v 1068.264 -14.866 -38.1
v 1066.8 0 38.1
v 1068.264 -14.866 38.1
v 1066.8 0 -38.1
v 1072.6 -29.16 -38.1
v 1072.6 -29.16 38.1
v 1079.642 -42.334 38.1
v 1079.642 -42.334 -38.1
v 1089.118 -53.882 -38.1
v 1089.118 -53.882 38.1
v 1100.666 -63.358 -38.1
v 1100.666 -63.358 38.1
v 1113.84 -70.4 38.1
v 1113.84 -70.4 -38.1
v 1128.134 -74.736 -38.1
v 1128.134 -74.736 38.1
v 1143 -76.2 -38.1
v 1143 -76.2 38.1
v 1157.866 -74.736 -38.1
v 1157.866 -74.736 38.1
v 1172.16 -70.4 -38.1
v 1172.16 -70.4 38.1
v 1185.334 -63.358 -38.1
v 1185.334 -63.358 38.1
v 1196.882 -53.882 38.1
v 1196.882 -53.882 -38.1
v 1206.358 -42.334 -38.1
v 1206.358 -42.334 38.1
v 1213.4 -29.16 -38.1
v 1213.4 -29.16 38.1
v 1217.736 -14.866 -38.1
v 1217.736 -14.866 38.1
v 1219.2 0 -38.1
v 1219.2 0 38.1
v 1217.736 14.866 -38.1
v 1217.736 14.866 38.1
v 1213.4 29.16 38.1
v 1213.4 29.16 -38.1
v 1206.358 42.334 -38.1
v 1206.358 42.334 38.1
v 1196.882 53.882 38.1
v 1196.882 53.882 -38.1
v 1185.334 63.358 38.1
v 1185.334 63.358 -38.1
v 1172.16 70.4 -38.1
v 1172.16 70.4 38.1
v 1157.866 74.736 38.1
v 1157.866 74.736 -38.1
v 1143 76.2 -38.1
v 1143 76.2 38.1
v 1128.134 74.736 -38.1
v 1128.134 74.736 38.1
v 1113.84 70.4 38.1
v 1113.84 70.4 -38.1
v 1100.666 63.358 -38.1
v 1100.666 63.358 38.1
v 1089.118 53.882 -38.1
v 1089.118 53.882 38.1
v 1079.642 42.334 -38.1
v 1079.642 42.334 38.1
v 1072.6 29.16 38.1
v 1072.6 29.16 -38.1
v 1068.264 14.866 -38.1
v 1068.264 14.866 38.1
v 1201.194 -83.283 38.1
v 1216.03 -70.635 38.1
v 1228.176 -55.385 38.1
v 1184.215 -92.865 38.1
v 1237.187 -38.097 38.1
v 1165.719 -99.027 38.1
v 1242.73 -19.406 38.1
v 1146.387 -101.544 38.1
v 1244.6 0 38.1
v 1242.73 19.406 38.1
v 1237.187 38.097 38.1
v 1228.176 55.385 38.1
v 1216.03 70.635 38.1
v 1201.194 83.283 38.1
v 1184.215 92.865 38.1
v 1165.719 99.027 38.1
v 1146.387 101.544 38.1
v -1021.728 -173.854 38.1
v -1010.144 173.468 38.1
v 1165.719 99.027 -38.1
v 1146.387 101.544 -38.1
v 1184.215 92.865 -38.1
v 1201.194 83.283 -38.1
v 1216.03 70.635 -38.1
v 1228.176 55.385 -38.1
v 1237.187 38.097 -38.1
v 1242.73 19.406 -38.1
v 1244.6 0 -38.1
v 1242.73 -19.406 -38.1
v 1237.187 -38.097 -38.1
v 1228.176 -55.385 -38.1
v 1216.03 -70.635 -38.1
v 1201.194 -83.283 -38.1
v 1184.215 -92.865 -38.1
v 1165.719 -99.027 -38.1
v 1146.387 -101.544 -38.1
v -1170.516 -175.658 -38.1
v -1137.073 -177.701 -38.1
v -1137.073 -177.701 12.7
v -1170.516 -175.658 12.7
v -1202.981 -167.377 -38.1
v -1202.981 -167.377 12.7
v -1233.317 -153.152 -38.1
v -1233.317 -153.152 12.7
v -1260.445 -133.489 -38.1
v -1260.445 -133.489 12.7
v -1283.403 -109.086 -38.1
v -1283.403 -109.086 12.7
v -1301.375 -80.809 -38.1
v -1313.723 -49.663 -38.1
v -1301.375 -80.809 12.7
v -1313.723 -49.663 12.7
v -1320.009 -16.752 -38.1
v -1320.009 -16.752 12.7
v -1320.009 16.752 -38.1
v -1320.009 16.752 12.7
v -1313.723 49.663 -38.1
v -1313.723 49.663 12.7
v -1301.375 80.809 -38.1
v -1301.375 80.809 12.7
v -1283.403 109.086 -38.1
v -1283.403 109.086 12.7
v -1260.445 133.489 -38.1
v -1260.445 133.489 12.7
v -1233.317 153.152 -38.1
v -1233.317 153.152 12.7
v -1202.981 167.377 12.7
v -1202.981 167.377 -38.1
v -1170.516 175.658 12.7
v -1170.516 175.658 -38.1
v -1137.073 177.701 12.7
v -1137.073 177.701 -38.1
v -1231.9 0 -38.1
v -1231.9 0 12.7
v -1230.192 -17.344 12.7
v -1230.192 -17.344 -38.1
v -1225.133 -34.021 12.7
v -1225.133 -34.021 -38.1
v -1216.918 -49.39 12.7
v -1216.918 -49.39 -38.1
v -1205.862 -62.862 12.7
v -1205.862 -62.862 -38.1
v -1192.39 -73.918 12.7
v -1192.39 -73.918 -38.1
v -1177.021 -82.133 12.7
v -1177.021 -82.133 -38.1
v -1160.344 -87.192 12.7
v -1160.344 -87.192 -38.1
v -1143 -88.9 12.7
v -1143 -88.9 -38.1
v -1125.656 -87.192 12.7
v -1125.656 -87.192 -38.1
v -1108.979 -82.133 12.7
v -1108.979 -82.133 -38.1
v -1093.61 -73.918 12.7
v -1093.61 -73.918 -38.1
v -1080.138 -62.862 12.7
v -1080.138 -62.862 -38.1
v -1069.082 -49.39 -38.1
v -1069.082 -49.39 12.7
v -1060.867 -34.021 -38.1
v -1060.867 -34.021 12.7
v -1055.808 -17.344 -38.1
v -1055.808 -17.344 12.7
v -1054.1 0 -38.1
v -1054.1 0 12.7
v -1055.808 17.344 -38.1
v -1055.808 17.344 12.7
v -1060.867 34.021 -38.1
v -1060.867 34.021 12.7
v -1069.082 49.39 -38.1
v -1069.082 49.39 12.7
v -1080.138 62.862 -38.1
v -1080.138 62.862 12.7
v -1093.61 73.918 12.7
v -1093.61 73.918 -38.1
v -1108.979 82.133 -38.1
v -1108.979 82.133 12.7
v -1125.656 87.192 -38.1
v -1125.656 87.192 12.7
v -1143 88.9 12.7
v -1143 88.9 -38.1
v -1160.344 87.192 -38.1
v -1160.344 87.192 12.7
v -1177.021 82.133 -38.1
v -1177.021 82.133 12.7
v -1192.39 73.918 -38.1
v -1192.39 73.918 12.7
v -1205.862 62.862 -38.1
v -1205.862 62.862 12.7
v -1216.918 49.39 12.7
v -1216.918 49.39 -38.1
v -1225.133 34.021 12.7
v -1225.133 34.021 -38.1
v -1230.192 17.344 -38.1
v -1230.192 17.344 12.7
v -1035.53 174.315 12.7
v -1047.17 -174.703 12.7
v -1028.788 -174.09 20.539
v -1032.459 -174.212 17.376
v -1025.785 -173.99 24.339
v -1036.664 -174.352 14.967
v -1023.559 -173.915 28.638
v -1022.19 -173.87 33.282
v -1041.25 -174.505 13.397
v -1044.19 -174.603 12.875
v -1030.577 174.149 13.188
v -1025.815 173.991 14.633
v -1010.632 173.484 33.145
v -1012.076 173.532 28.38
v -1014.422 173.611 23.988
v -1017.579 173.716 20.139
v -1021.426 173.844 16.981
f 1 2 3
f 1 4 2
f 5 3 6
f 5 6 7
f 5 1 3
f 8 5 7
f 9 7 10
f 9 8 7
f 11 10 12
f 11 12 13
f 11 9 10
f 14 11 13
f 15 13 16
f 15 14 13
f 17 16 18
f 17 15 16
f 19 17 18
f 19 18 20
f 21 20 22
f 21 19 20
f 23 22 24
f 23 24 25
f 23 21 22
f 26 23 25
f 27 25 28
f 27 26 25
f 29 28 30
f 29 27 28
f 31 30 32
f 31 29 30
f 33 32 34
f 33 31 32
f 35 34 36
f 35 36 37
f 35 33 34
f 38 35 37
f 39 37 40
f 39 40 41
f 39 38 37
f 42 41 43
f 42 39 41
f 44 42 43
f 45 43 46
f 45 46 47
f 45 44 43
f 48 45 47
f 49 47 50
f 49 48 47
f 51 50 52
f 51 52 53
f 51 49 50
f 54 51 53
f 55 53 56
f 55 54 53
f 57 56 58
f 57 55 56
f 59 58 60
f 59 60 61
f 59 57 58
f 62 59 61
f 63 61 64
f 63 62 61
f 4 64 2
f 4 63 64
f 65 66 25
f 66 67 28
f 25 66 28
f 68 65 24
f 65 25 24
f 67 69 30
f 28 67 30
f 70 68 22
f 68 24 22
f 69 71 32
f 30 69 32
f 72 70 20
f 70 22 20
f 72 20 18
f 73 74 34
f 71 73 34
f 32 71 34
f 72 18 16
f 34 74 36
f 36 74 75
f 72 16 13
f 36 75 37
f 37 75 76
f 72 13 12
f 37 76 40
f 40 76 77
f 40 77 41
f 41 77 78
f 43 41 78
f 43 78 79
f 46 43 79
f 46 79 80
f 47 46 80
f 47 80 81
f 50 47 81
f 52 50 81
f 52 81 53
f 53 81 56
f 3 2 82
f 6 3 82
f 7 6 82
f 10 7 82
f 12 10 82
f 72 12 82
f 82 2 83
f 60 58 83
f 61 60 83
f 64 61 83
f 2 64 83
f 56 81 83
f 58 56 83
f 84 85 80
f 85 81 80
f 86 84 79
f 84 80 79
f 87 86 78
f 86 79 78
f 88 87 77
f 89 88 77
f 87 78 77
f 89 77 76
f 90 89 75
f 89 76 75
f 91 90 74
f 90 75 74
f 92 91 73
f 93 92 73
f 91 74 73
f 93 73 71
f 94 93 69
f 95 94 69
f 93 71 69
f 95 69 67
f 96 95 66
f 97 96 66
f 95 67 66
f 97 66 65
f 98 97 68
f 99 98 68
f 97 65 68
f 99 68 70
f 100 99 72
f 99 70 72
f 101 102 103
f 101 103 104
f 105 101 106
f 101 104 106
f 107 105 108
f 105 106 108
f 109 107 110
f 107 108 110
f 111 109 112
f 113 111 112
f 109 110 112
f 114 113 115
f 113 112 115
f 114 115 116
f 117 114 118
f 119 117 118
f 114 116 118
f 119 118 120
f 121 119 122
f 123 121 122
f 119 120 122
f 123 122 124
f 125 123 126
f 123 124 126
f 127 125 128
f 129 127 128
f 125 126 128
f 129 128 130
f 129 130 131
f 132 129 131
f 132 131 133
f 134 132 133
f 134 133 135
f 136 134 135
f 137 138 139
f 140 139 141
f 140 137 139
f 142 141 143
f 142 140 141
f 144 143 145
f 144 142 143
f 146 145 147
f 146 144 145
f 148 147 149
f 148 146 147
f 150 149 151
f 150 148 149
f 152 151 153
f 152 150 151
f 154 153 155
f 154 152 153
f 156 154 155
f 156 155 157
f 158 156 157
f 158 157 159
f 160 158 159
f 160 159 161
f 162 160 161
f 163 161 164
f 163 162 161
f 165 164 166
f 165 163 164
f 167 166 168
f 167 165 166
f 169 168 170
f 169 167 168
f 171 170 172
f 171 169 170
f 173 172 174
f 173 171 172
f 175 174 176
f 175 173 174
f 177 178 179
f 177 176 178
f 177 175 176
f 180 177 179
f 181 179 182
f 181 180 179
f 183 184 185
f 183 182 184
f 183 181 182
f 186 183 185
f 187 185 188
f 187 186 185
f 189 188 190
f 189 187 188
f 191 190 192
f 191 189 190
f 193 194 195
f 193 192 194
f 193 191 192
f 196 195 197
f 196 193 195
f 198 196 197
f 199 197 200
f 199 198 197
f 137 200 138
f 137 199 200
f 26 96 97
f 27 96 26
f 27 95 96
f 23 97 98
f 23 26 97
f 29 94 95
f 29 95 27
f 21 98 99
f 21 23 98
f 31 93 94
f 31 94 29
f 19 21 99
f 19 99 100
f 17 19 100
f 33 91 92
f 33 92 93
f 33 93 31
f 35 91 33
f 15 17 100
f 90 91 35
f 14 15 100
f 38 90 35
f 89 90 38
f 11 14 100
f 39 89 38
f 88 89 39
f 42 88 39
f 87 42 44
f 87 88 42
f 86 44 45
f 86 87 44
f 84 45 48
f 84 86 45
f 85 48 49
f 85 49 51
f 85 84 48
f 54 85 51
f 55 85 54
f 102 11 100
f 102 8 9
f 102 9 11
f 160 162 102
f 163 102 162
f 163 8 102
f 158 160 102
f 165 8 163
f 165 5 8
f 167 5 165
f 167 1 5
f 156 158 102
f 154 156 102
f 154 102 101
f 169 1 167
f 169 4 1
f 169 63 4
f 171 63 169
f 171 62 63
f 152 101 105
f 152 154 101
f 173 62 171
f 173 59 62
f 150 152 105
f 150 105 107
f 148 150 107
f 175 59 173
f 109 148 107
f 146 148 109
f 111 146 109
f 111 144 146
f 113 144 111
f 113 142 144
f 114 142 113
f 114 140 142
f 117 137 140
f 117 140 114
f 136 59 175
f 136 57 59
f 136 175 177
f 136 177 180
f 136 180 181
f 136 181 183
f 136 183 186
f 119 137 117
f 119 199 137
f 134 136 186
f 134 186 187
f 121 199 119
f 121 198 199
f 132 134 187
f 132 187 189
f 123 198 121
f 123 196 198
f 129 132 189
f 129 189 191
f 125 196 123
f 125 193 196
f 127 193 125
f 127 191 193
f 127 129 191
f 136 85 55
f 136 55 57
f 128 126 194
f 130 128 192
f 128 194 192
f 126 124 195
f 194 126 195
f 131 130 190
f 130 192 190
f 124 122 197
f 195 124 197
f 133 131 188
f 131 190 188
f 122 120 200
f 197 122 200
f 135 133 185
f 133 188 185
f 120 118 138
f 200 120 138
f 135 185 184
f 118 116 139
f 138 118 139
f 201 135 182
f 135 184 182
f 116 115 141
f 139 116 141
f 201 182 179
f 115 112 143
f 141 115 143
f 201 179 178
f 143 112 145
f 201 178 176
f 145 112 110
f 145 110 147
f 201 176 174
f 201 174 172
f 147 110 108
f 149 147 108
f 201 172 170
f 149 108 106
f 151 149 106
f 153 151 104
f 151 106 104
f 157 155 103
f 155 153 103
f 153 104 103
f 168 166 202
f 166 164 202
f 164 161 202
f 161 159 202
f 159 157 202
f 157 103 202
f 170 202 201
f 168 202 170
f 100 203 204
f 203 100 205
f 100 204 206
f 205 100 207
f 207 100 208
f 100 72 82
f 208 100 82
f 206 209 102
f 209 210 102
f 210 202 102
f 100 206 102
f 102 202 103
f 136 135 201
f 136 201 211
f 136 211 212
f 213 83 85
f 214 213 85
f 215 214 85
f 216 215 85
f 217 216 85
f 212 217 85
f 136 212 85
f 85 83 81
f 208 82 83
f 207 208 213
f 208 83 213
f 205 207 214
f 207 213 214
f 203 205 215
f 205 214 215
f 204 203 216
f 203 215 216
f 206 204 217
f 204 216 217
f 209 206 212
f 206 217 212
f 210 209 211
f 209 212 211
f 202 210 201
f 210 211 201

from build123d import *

# Parameters (mm, degrees)
SKETCH1_R               = 88.9
SKETCH1_R_2             = 76.2
BOSS_EXTRUDE1_DEPTH     = 38.1
CUT_EXTRUDE1_DEPTH      = 1364.467617688
CUT_EXTRUDE1_DEPTH_BACK = 1364.467617688
SKETCH2_W               = 304.8
SKETCH2_H               = 25.4
FILLET1_R               = 25.4


with BuildPart() as part:
    # Sketch1 → Boss-Extrude1 (new, symmetric)
    with BuildSketch(Plane.XY):
        with BuildLine():
            Line((-1137.073333333, 177.701194769), (1146.386666667, 101.543539868))
            ThreePointArc((1146.386666667, 101.543539868), (1244.6, 0), (1146.386666667, -101.543539868))
            Line((1146.386666667, -101.543539868), (-1137.073333333, -177.701194769))
            ThreePointArc((-1137.073333333, -177.701194769), (-1320.8, 0), (-1137.073333333, 177.701194769))
        make_face()
        with Locations(Location((-1143, 0, 0), (0, 0, 180))):
            Circle(SKETCH1_R, mode=Mode.SUBTRACT)
        with Locations(Location((1143, 0, 0), (0, 0, 180))):
            Circle(SKETCH1_R_2, mode=Mode.SUBTRACT)
    extrude(amount=BOSS_EXTRUDE1_DEPTH, both=True)

    # Sketch2 → Cut-Extrude1 (cut, two sides: drawn at the far end of the back side and taken through both)
    with BuildSketch(Plane(origin=(4.656666667, 139.622367318, 0), x_dir=(0.9994442900376634, -0.03333333333333318, 0), z_dir=(0.03333333333333318, 0.9994442900376634, 0)).offset(-CUT_EXTRUDE1_DEPTH_BACK)):
        with Locations((-1167.764823513, -25.4)):
            Rectangle(SKETCH2_W, SKETCH2_H)
    extrude(amount=CUT_EXTRUDE1_DEPTH + CUT_EXTRUDE1_DEPTH_BACK, mode=Mode.SUBTRACT)

    # Fillet1
    fillet1_edges = [part.edges().sort_by_distance(p)[0] for p in [
        (-1015.935828218, -0.193171338, 12.7),
    ]]
    fillet(fillet1_edges, radius=FILLET1_R - 0.0001)  # a hair under: the kernel refuses the full size


solid = part.part
